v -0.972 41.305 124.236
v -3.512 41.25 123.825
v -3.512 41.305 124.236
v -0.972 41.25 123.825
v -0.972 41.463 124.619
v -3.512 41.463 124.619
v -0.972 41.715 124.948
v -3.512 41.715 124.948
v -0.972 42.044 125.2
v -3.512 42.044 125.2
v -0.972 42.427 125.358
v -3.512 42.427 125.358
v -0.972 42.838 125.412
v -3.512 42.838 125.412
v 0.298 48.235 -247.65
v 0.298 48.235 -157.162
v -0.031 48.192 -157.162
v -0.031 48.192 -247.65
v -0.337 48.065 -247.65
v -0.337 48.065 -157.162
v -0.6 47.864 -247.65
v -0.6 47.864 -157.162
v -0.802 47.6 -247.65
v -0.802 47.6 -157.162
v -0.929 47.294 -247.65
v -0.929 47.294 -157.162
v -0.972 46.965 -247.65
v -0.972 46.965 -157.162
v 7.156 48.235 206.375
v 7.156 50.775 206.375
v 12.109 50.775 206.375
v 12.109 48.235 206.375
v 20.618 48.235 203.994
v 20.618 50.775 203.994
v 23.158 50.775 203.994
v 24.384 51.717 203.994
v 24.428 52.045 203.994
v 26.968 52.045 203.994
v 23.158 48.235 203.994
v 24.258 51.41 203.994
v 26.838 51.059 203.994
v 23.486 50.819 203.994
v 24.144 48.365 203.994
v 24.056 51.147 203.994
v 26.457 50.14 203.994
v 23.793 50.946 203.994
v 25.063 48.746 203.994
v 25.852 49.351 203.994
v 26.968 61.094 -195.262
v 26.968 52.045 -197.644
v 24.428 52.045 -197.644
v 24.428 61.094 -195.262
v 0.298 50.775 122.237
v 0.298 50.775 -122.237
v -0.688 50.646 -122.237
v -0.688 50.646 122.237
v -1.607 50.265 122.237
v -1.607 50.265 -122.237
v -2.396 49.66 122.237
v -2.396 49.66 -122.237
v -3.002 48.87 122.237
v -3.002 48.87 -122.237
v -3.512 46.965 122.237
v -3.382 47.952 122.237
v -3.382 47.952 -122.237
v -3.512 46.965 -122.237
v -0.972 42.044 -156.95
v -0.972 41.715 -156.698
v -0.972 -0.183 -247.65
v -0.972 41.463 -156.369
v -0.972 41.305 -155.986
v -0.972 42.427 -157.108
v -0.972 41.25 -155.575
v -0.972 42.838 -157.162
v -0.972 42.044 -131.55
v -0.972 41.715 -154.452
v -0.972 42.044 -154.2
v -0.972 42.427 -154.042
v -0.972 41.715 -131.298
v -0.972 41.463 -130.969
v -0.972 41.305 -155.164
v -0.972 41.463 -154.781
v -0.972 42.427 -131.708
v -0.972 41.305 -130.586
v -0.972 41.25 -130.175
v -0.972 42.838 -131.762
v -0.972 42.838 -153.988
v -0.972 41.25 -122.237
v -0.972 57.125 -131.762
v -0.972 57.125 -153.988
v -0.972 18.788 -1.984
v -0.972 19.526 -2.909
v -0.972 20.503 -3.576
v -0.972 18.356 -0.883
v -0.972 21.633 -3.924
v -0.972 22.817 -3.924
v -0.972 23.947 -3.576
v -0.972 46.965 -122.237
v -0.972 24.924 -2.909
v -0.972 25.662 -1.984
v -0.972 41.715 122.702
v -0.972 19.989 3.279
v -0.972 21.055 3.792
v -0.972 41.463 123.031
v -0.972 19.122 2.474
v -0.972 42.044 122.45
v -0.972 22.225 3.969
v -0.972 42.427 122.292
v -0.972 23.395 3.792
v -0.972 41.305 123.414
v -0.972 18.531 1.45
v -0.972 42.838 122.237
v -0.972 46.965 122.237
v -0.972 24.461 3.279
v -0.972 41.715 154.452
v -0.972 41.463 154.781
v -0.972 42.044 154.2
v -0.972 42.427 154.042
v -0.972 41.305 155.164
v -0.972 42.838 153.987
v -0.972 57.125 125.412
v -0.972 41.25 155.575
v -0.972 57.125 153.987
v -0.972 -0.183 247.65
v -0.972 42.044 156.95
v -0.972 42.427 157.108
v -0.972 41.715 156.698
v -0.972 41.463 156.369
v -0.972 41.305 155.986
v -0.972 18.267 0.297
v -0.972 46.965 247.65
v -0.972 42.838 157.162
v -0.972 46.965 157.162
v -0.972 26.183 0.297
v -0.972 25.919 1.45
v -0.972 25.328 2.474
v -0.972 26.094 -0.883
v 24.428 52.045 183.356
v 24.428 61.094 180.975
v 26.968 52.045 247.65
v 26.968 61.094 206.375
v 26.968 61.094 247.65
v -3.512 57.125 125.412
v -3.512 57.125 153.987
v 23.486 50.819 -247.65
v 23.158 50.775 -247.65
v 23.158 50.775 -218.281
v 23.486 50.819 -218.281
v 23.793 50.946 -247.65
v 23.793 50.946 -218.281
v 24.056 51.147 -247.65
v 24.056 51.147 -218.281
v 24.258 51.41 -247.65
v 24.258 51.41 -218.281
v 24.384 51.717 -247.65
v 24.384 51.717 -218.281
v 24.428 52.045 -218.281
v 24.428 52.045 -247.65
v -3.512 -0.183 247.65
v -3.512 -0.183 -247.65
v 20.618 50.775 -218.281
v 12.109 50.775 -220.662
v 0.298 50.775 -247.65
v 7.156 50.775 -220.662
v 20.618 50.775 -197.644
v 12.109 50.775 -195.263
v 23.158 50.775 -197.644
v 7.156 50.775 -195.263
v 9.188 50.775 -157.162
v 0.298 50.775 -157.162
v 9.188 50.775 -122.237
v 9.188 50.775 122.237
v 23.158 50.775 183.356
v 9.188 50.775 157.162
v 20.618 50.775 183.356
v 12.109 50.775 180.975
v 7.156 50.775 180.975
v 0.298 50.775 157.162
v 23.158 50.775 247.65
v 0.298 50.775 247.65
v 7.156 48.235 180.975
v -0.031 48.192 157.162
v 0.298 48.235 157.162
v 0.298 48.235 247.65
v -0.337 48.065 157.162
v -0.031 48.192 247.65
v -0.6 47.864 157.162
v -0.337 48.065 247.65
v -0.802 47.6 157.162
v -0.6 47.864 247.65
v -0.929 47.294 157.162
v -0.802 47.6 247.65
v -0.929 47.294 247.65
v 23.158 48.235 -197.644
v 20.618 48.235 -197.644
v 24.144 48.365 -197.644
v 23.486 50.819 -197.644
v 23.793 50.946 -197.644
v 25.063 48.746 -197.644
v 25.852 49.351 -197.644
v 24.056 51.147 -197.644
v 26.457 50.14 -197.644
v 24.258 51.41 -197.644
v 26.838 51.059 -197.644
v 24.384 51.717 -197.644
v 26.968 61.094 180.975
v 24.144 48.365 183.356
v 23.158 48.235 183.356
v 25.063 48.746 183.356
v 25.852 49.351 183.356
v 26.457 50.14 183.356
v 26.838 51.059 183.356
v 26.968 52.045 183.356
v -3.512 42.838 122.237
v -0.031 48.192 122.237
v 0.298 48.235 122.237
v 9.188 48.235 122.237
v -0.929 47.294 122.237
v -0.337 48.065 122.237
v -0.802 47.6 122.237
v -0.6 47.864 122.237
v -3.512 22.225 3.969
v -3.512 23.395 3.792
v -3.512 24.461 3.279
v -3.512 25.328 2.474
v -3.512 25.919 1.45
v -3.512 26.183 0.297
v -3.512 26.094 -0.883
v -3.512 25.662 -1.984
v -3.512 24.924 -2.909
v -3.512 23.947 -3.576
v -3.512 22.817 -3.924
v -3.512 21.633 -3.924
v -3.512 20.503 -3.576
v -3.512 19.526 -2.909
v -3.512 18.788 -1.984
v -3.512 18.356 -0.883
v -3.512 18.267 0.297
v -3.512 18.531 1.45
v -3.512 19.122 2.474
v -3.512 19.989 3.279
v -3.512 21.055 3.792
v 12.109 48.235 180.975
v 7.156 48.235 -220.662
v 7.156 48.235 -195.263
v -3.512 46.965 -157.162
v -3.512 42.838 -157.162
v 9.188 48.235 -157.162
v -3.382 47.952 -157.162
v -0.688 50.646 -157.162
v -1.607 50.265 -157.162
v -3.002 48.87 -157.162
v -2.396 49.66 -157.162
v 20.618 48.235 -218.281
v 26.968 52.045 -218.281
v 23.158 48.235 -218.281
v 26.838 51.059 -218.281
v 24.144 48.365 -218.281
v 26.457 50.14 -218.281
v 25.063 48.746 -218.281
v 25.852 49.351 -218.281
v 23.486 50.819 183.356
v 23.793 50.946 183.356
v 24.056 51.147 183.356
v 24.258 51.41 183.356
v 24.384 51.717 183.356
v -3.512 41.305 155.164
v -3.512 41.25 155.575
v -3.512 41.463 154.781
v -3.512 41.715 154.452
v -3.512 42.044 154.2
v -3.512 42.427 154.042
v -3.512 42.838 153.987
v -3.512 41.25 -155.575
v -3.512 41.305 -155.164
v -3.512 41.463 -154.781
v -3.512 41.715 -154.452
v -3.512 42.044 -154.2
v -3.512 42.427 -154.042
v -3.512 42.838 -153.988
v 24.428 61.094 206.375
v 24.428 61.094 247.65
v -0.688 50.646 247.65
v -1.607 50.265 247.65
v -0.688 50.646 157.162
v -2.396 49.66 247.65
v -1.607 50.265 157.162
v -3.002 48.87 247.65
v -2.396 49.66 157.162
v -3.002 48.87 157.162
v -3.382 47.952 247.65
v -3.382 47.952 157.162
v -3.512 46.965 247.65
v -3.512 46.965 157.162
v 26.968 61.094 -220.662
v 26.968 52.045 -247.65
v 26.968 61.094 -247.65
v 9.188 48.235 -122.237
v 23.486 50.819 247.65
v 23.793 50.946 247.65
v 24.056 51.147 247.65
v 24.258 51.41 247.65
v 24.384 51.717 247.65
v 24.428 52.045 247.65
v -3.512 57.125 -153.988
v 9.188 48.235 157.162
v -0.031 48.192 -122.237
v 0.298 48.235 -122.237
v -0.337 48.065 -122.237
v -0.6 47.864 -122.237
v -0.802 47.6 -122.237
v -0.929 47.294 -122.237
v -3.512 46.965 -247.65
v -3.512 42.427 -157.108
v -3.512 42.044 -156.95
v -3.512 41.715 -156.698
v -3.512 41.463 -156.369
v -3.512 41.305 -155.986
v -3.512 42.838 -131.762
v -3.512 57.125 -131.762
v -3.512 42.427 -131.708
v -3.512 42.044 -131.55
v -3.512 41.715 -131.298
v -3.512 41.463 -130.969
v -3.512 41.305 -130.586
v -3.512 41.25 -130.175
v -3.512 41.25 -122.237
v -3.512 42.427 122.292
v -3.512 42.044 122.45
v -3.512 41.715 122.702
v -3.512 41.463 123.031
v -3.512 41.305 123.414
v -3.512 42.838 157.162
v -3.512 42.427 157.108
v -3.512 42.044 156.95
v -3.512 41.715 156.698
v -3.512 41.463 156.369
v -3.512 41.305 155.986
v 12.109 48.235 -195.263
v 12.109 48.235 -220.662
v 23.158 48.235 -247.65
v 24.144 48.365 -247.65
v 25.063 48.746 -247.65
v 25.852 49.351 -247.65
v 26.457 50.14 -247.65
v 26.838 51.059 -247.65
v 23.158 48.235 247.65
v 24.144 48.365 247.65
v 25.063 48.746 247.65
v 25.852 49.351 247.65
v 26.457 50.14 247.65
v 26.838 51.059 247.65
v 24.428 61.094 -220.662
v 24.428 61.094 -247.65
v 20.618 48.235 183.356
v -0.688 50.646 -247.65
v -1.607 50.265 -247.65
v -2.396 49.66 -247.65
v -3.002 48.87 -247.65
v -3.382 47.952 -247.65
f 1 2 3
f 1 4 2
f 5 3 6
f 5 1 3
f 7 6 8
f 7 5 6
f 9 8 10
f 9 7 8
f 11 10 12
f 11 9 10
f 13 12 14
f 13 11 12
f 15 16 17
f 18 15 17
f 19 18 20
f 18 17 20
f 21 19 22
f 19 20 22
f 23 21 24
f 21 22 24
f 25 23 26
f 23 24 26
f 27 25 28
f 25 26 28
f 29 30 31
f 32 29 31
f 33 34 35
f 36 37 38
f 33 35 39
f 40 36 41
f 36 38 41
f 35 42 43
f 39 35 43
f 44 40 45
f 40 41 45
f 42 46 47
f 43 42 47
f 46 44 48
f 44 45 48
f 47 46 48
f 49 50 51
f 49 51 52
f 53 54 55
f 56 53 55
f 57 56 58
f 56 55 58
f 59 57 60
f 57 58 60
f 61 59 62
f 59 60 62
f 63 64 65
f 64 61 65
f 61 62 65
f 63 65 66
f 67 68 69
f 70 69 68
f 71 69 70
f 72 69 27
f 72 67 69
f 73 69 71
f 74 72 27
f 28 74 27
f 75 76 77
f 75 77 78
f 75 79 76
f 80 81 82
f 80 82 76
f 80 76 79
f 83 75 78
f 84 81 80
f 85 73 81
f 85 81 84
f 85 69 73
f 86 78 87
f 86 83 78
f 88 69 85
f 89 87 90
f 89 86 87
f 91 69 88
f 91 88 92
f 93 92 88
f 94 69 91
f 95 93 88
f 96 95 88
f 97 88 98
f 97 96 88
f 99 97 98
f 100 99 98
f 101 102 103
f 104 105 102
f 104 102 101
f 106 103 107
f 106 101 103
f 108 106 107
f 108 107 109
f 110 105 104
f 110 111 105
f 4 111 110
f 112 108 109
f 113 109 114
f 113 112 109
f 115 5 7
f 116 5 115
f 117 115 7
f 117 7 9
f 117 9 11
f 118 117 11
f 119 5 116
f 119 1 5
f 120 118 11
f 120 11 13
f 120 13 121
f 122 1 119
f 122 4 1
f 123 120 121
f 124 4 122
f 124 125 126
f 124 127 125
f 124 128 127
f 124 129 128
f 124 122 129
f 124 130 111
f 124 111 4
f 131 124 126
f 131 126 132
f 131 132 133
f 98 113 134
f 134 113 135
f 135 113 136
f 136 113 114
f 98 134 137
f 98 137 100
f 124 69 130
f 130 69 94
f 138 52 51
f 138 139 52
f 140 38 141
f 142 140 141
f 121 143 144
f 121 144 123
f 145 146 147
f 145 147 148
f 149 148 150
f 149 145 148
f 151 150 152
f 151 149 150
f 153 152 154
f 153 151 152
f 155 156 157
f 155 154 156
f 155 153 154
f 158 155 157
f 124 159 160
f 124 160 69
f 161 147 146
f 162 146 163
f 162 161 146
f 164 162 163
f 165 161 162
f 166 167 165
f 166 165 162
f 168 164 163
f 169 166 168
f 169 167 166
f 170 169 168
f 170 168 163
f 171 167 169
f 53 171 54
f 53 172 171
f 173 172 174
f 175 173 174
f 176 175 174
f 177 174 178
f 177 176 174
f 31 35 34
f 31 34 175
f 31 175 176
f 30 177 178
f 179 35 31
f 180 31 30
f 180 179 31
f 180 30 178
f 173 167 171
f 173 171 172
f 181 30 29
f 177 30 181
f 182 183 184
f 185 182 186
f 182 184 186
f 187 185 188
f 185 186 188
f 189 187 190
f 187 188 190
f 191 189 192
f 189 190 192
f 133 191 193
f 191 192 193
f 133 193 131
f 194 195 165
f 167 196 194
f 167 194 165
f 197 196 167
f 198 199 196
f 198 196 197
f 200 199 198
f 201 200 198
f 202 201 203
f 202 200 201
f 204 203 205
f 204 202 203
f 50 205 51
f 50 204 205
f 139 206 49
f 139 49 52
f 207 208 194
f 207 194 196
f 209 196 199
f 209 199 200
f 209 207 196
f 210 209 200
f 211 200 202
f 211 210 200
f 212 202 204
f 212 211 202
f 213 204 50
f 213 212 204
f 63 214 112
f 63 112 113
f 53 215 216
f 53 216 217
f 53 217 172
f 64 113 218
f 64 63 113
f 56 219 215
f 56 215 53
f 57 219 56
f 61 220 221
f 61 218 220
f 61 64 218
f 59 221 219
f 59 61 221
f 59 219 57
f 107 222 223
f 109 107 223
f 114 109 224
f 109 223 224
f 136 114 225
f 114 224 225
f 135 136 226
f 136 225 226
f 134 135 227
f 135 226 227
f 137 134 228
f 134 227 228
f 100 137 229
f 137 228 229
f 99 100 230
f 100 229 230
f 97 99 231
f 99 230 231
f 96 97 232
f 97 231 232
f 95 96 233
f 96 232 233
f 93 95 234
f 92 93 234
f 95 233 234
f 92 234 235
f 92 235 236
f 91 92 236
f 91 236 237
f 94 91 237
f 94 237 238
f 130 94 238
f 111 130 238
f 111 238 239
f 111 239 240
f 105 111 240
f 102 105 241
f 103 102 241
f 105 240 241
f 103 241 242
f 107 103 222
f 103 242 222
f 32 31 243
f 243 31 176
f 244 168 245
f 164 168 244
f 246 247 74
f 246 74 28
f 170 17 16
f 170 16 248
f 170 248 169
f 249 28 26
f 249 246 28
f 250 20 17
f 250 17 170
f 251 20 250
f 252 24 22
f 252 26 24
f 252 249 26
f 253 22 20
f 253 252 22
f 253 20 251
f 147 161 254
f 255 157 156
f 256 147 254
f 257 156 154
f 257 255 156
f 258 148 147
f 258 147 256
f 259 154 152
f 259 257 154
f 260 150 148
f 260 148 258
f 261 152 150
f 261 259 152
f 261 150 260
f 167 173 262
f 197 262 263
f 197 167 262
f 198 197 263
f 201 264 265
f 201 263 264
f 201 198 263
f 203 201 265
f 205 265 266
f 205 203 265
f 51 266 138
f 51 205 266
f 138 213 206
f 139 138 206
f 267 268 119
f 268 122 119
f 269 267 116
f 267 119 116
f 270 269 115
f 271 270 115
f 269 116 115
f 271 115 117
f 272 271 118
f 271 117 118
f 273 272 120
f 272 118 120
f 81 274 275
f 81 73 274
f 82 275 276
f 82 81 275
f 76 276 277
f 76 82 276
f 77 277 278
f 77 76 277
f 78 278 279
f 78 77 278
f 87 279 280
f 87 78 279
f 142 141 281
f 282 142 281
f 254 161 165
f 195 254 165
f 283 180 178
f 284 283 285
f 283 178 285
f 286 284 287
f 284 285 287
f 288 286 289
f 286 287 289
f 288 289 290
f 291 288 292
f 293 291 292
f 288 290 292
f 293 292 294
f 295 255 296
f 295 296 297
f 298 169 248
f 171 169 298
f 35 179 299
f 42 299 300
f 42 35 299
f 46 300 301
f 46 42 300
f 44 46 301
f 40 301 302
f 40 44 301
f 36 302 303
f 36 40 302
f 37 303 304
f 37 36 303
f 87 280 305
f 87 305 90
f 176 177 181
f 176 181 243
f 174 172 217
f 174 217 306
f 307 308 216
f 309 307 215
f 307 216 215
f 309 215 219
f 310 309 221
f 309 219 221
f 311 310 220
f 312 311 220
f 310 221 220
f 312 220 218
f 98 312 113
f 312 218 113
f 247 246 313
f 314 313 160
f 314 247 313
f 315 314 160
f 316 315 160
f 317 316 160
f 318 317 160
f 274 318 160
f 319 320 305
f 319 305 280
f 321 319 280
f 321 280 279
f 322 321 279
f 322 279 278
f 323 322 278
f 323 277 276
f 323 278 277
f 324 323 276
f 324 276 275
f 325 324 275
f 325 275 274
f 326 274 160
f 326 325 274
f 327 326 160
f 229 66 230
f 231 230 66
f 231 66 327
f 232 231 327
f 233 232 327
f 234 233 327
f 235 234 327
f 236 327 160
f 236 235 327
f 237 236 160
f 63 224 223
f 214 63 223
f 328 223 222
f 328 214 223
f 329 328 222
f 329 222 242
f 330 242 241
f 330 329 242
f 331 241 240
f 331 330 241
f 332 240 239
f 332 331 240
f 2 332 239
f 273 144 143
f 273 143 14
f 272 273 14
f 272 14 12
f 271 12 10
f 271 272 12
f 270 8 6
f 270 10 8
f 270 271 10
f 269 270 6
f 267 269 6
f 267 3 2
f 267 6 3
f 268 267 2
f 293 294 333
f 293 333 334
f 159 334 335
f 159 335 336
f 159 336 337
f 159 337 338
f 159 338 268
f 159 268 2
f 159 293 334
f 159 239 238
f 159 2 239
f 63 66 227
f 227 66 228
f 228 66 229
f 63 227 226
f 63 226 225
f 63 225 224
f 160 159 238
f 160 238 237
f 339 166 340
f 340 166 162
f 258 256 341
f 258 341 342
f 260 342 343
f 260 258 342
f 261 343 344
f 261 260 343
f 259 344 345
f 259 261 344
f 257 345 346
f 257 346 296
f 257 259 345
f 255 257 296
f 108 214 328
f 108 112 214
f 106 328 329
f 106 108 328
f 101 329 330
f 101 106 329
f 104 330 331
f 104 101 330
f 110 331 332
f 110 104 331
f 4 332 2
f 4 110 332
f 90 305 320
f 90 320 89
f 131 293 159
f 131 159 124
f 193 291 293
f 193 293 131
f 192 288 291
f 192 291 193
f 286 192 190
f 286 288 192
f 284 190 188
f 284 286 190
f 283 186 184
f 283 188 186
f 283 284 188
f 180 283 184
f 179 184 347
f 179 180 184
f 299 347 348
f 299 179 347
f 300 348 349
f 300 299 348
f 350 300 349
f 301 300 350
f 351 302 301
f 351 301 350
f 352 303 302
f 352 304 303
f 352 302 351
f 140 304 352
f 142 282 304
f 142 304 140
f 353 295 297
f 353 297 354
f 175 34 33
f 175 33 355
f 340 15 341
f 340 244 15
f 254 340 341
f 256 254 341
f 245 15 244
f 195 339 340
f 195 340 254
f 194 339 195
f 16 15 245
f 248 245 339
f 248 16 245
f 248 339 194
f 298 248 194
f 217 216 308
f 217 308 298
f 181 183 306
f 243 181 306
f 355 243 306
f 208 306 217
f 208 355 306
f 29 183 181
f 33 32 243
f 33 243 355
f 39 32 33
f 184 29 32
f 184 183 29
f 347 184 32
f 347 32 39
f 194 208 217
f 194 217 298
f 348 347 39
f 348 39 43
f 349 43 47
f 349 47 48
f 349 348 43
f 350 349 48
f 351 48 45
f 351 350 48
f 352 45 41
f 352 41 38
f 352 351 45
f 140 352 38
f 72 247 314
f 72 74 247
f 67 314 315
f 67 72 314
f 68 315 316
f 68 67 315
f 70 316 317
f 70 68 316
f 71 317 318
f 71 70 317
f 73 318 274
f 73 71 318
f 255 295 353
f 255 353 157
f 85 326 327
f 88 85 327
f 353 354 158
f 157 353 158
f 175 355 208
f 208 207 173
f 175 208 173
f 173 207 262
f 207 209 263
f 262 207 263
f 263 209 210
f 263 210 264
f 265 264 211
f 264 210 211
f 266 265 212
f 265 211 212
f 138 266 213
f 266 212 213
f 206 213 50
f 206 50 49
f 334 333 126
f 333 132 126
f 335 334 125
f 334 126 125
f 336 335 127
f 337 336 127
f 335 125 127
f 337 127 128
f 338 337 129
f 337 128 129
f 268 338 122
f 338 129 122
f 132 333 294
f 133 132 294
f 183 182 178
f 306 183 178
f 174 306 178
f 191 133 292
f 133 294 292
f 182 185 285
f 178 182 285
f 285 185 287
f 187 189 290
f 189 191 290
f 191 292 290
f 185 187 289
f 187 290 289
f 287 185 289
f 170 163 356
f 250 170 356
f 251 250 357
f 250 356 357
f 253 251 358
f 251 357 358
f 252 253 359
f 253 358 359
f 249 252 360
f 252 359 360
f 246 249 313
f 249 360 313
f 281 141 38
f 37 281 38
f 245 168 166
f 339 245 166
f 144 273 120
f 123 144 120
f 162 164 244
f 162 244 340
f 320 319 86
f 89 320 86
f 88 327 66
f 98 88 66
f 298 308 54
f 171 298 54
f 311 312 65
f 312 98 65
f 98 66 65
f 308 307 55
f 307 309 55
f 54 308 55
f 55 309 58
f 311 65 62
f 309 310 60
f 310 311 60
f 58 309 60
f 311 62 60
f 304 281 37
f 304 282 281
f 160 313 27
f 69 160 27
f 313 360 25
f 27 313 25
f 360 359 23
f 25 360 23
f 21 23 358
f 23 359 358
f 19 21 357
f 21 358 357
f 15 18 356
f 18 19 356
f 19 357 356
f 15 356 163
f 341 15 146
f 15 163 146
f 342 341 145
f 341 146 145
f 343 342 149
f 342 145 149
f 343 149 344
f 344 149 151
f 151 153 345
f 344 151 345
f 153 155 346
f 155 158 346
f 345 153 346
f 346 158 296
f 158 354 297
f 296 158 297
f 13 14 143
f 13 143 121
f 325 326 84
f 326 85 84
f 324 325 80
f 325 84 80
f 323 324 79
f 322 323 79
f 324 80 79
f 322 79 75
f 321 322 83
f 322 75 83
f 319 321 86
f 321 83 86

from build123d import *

# Parameters (mm, degrees)
EXTRUDE1_DEPTH     = 247.65
FILLET2_R          = 1.27
FILLET3_R          = 3.81
SKETCH2_W          = 34.925
SKETCH2_H          = 9.525
CUT_EXTRUDE1_DEPTH = 12.7
SKETCH3_W          = 2.54
SKETCH3_H          = 22.225
SKETCH3_H_2        = 28.575
EXTRUDE2_DEPTH     = 15.875
FILLET1_R          = 1.5875
SKETCH4_W          = 4.953
SKETCH4_H          = 25.4
CUT_EXTRUDE2_DEPTH = 2.54
CUT_EXTRUDE3_DEPTH = 6.35
SKETCH6_R          = 3.96875
CUT_EXTRUDE4_DEPTH = 2.54


with BuildPart() as part:
    # Sketch1 → Extrude1 (new, symmetric)
    with BuildSketch(Plane.XY):
        Polygon((-3.512251891, 50.775495097), (-3.512251891, -0.183254903), (-0.972251891, -0.183254903), (-0.972251891, 48.235495097), (26.967748109, 48.235495097), (26.967748109, 61.094245097), (24.427748109, 61.094245097), (24.427748109, 50.775495097), align=None)
    extrude(amount=EXTRUDE1_DEPTH, both=True)

    # Fillet2
    fillet2_edges = [part.edges().sort_by_distance(p)[0] for p in [
        (24.427748109, 50.775495097, 0),
        (-0.972251891, 48.235495097, 0),
    ]]
    fillet(fillet2_edges, radius=FILLET2_R)

    # Fillet3
    fillet3_edges = [part.edges().sort_by_distance(p)[0] for p in [
        (26.967748109, 48.235495097, 0),
        (-3.512251891, 50.775495097, 0),
    ]]
    fillet(fillet3_edges, radius=FILLET3_R)

    # Sketch2 → Cut-Extrude1 (cut)
    with BuildSketch(Plane.ZY.offset(3.512251891)):
        with Locations((-139.7, 46.012995097)):
            Rectangle(SKETCH2_W, SKETCH2_H)
        with Locations((139.7, 46.012995097)):
            Rectangle(SKETCH2_W, SKETCH2_H)
    extrude(amount=-CUT_EXTRUDE1_DEPTH, mode=Mode.SUBTRACT)

    # Sketch3 → Extrude2 (add)
    with BuildSketch(Plane(origin=(0, 41.250495097, 0), x_dir=(1, 0, 0), z_dir=(0, 1, 0))):
        with Locations((-2.242251891, 142.875)):
            Rectangle(SKETCH3_W, SKETCH3_H)
        with Locations((-2.242251891, -139.7)):
            Rectangle(SKETCH3_W, SKETCH3_H_2)
    extrude(amount=EXTRUDE2_DEPTH)

    # Fillet1
    fillet1_edges = [part.edges().sort_by_distance(p)[0] for p in [
        (-2.242251891, 41.250495097, -153.9875),
        (-2.242251891, 41.250495097, -131.7625),
        (-2.242251891, 41.250495097, 125.4125),
        (-2.242251891, 41.250495097, 153.9875),
        (-2.242251891, 41.250495097, -157.1625),
        (-2.242251891, 41.250495097, 157.1625),
        (-2.242251891, 41.250495097, 122.2375),
    ]]
    fillet(fillet1_edges, radius=FILLET1_R - 0.0001)  # a hair under: the kernel refuses the full size

    # Sketch4 → Cut-Extrude2 (cut)
    with BuildSketch(Plane(origin=(0, 50.775495097, 0), x_dir=(1, 0, 0), z_dir=(0, 1, 0))):
        with Locations((9.632248109, 207.9625)):
            Rectangle(SKETCH4_W, SKETCH4_H)
        with Locations((9.632248109, -193.675)):
            Rectangle(SKETCH4_W, SKETCH4_H)
    extrude(amount=-CUT_EXTRUDE2_DEPTH, mode=Mode.SUBTRACT)

    # Sketch5 → Cut-Extrude3 (cut)
    with BuildSketch(Plane(origin=(26.967748109, 0, 0), x_dir=(0, 0, -1), z_dir=(1, 0, 0))):
        Polygon((195.2625, 61.094245097), (220.6625, 61.094245097), (218.28125, 52.045495097), (218.28125, 48.235495097), (197.64375, 48.235495097), (197.64375, 52.045495097), align=None)
        Polygon((-180.975, 61.094245097), (-206.375, 61.094245097), (-203.99375, 52.045495097), (-203.99375, 48.235495097), (-183.35625, 48.235495097), (-183.35625, 52.045495097), align=None)
    extrude(amount=-CUT_EXTRUDE3_DEPTH, mode=Mode.SUBTRACT)

    # Sketch6 → Cut-Extrude4 (cut)
    with BuildSketch(Plane.ZY.offset(3.512251891)):
        with Locations((0, 22.225)):
            Circle(SKETCH6_R)
    extrude(amount=-CUT_EXTRUDE4_DEPTH, mode=Mode.SUBTRACT)


solid = part.part
